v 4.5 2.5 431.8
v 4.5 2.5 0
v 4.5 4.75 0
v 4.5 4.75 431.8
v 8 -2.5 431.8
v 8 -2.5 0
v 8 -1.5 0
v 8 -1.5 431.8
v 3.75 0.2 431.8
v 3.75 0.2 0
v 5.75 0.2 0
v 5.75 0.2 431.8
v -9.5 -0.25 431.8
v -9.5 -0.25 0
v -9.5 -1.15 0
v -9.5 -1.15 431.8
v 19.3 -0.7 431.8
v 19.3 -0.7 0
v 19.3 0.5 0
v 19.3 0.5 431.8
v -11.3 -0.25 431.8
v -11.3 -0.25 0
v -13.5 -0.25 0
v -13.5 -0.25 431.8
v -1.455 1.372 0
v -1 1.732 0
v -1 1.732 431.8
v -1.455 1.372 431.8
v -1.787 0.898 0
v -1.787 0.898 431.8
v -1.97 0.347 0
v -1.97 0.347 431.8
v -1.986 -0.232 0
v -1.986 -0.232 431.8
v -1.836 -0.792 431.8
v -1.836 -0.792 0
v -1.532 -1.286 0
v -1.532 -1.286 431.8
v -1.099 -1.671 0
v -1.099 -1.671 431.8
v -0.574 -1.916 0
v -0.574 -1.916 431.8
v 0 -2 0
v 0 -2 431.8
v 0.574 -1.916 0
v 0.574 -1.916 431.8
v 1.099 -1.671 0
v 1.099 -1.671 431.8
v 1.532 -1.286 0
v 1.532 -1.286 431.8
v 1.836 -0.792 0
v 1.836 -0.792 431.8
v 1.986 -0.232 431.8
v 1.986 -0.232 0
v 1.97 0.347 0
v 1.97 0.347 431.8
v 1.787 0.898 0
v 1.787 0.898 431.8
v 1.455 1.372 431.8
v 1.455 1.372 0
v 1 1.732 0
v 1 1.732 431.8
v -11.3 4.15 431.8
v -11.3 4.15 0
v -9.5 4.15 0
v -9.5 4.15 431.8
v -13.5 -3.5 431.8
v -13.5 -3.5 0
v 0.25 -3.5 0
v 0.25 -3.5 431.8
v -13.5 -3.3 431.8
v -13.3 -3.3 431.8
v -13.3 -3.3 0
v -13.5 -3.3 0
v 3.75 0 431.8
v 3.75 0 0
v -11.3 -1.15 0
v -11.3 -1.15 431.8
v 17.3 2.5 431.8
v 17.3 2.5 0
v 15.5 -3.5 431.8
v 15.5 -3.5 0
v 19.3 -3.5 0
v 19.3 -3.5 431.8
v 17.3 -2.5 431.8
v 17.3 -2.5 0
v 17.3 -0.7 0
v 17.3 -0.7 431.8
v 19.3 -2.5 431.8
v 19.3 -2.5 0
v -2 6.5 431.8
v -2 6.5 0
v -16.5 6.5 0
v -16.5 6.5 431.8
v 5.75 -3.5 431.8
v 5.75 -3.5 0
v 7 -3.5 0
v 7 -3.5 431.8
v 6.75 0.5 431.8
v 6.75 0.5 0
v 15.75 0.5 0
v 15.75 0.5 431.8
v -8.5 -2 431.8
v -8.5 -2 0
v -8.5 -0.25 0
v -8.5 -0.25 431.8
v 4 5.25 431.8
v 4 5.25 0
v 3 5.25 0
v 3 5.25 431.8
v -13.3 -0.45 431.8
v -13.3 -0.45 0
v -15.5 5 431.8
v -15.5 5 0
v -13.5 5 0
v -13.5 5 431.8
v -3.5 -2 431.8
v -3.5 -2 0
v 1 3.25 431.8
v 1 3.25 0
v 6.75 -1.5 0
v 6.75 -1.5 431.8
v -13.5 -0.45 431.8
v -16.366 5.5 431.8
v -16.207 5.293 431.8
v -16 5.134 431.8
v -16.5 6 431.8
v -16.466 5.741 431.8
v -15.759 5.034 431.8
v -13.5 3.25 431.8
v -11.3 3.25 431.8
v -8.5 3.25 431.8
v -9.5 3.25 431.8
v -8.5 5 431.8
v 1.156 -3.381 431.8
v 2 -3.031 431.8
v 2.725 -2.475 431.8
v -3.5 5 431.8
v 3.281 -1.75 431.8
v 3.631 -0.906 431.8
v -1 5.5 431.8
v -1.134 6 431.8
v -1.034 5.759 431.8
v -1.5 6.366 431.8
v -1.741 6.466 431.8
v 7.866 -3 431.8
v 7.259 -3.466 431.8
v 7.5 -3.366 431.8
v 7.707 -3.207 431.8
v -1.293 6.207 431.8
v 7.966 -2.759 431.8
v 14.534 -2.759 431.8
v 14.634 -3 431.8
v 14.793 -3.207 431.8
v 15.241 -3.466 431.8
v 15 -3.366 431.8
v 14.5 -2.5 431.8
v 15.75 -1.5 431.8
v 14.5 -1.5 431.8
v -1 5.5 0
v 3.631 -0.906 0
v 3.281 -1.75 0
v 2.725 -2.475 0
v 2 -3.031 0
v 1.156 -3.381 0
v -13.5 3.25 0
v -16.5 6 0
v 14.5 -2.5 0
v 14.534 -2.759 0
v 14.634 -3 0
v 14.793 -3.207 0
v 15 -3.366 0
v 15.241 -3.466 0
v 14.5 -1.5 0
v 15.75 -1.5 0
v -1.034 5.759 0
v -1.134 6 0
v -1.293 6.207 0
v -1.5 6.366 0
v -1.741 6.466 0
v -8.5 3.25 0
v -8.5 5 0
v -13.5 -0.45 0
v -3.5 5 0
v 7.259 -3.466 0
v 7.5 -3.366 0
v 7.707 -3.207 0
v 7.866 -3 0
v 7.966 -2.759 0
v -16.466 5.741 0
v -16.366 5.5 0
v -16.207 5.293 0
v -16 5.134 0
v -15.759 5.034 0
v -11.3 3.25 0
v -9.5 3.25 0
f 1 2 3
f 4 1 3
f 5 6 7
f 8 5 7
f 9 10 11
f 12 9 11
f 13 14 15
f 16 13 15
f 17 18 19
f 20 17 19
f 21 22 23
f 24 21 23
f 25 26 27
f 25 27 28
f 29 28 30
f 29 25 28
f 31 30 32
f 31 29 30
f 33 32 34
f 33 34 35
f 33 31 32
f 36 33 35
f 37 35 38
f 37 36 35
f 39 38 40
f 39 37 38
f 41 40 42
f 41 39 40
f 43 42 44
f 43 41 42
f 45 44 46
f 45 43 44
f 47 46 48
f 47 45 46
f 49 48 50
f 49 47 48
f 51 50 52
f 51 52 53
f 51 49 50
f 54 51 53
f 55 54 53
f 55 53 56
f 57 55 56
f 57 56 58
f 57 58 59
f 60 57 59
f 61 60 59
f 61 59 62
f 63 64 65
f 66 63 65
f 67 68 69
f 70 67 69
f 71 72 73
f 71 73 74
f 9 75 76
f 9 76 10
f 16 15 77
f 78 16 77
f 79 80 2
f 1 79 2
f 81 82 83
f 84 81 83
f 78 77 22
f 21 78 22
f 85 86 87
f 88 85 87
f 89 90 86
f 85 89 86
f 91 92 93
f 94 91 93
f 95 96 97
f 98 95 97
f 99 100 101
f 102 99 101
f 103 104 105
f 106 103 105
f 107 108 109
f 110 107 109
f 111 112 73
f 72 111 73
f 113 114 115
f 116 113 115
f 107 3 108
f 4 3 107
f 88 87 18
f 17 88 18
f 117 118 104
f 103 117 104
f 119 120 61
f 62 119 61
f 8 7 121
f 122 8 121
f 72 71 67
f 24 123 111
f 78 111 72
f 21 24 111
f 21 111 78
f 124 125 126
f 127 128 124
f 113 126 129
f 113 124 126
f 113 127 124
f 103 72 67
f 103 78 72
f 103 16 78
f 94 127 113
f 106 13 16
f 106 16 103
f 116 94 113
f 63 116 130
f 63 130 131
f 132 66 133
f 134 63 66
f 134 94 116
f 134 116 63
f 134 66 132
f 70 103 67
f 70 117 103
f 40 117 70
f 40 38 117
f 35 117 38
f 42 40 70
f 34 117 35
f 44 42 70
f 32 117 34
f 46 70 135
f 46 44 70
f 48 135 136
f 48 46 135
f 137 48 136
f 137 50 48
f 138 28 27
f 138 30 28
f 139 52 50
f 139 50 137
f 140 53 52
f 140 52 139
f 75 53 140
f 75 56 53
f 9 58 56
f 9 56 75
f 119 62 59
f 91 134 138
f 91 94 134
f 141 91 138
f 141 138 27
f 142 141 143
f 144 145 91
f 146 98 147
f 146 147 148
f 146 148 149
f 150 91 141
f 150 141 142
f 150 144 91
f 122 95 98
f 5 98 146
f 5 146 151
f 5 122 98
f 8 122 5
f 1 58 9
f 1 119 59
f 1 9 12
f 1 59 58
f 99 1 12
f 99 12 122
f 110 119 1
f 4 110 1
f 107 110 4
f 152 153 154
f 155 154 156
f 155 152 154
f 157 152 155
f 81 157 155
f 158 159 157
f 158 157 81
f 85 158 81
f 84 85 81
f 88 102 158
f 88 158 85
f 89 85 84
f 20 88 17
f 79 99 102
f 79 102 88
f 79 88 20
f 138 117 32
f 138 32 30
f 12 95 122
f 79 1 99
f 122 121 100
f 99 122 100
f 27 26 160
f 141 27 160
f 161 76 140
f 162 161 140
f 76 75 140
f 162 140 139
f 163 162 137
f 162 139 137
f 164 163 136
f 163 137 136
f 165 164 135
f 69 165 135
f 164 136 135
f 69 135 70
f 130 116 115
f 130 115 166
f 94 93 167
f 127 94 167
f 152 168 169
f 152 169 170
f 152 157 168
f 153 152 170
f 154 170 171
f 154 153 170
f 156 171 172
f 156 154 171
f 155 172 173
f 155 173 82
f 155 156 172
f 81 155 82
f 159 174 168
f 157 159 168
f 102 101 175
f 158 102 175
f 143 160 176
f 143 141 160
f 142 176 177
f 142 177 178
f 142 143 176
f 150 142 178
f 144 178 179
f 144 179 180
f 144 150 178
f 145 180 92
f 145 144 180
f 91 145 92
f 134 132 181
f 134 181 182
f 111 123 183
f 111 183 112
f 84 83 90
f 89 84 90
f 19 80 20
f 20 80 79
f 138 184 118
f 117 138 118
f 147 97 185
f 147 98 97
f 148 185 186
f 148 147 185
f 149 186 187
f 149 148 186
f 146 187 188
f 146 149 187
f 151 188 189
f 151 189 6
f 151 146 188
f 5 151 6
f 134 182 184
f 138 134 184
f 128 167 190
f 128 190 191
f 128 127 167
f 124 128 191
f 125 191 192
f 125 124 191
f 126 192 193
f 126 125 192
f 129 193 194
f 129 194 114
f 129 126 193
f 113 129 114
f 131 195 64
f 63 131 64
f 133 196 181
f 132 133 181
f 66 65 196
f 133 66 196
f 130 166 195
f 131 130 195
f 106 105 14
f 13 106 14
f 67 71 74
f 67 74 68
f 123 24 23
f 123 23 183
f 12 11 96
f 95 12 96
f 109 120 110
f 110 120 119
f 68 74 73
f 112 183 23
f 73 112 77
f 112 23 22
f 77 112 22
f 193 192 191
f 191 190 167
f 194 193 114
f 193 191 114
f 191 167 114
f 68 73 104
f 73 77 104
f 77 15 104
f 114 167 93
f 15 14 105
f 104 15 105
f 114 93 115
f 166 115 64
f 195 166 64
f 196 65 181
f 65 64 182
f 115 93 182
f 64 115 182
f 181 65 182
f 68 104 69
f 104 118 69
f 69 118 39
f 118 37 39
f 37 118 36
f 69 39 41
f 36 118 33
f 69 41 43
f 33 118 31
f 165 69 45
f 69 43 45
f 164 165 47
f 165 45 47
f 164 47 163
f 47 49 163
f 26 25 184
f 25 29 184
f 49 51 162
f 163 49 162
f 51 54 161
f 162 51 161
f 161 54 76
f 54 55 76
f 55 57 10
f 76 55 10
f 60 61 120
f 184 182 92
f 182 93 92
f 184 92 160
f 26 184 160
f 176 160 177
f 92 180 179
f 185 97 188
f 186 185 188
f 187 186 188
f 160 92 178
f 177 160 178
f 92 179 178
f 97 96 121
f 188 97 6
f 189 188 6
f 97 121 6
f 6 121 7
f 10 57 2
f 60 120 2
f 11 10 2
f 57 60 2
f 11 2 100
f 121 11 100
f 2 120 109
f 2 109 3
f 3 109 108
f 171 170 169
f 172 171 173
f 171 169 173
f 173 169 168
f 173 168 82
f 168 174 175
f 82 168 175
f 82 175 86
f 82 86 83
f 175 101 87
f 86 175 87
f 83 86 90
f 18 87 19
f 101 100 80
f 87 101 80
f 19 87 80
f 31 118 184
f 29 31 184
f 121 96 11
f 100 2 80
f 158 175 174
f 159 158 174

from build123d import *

# Parameters (mm, degrees)
PAD_DEPTH       = 431.8
FILLET_R        = 1
CHAMFER_SIZE    = 0.5
CHAMFER001_SIZE = 2
FILLET001_R     = 3.5
FILLET002_R     = 1
CHAMFER002_SIZE = 2
FILLET003_R     = 1


with BuildPart() as part:
    # Sketch → Pad (new body)
    with BuildSketch(Plane.XY):
        with BuildLine():
            Line((-13.5, -3.5), (3.75, -3.5))
            Line((3.75, -3.5), (3.75, 0.2))
            Line((3.75, 0.2), (5.75, 0.2))
            Line((5.75, 0.2), (5.75, -3.5))
            Line((5.75, -3.5), (8, -3.5))
            Line((8, -3.5), (8, -1.5))
            Line((8, -1.5), (6.75, -1.5))
            Line((6.75, -1.5), (6.75, 0.5))
            Line((6.75, 0.5), (15.75, 0.5))
            Line((15.75, 0.5), (15.75, -1.5))
            Line((15.75, -1.5), (14.5, -1.5))
            Line((14.5, -1.5), (14.5, -3.5))
            Line((14.5, -3.5), (19.3, -3.5))
            Line((19.3, -3.5), (19.3, -2.5))
            Line((19.3, -2.5), (17.3, -2.5))
            Line((17.3, -2.5), (17.3, -0.7))
            Line((17.3, -0.7), (19.3, -0.7))
            Line((19.3, -0.7), (19.3, 2.5))
            Line((19.3, 2.5), (4.5, 2.5))
            Line((4.5, 2.5), (4.5, 5.25))
            Line((4.5, 5.25), (1, 5.25))
            Line((1, 5.25), (1, 1.732051))
            ThreePointArc((-1, 1.732051), (0, -2), (1, 1.732051))
            Line((-1, 1.732051), (-1, 6.5))
            Line((-1, 6.5), (-16.5, 6.5))
            Line((-16.5, 6.5), (-16.5, 5))
            Line((-16.5, 5), (-13.5, 5))
            Line((-13.5, 5), (-13.5, 3.25))
            Line((-13.5, 3.25), (-11.3, 3.25))
            Line((-11.3, 3.25), (-11.3, 4.15))
            Line((-11.3, 4.15), (-9.5, 4.15))
            Line((-9.5, 4.15), (-9.5, 3.25))
            Line((-9.5, 3.25), (-8.5, 3.25))
            Line((-8.5, 3.25), (-8.5, 5))
            Line((-8.5, 5), (-3.5, 5))
            Line((-3.5, 5), (-3.5, -2))
            Line((-3.5, -2), (-8.5, -2))
            Line((-8.5, -2), (-8.5, -0.25))
            Line((-8.5, -0.25), (-9.5, -0.25))
            Line((-9.5, -0.25), (-9.5, -1.15))
            Line((-9.5, -1.15), (-11.3, -1.15))
            Line((-11.3, -1.15), (-11.3, -0.25))
            Line((-11.3, -0.25), (-13.5, -0.25))
            Line((-13.5, -0.25), (-13.5, -0.45))
            Line((-13.5, -0.45), (-13.3, -0.45))
            Line((-13.3, -0.45), (-13.3, -3.3))
            Line((-13.3, -3.3), (-13.5, -3.3))
            Line((-13.5, -3.3), (-13.5, -3.5))
        make_face()
    extrude(amount=PAD_DEPTH)

    # Fillet
    fillet_edges = [part.edges().sort_by_distance(p)[0] for p in [
        (-1, 6.5, 215.9),
    ]]
    fillet(fillet_edges, radius=FILLET_R)

    # Chamfer
    chamfer_edges = [part.edges().sort_by_distance(p)[0] for p in [
        (4.5, 5.25, 215.9),
    ]]
    chamfer(chamfer_edges, length=CHAMFER_SIZE)

    # Chamfer001
    chamfer001_edges = [part.edges().sort_by_distance(p)[0] for p in [
        (1, 5.25, 215.9),
    ]]
    chamfer(chamfer001_edges, length=CHAMFER001_SIZE)

    # Fillet001
    fillet001_edges = [part.edges().sort_by_distance(p)[0] for p in [
        (3.75, -3.5, 215.9),
    ]]
    fillet(fillet001_edges, radius=FILLET001_R)

    # Fillet002
    fillet002_edges = [part.edges().sort_by_distance(p)[0] for p in [
        (8, -3.5, 215.9),
        (14.5, -3.5, 215.9),
    ]]
    fillet(fillet002_edges, radius=FILLET002_R)

    # Chamfer002
    chamfer002_edges = [part.edges().sort_by_distance(p)[0] for p in [
        (19.3, 2.5, 215.9),
    ]]
    chamfer(chamfer002_edges, length=CHAMFER002_SIZE)

    # Fillet003
    fillet003_edges = [part.edges().sort_by_distance(p)[0] for p in [
        (-16.5, 5, 215.9),
    ]]
    fillet(fillet003_edges, radius=FILLET003_R)


solid = part.part
